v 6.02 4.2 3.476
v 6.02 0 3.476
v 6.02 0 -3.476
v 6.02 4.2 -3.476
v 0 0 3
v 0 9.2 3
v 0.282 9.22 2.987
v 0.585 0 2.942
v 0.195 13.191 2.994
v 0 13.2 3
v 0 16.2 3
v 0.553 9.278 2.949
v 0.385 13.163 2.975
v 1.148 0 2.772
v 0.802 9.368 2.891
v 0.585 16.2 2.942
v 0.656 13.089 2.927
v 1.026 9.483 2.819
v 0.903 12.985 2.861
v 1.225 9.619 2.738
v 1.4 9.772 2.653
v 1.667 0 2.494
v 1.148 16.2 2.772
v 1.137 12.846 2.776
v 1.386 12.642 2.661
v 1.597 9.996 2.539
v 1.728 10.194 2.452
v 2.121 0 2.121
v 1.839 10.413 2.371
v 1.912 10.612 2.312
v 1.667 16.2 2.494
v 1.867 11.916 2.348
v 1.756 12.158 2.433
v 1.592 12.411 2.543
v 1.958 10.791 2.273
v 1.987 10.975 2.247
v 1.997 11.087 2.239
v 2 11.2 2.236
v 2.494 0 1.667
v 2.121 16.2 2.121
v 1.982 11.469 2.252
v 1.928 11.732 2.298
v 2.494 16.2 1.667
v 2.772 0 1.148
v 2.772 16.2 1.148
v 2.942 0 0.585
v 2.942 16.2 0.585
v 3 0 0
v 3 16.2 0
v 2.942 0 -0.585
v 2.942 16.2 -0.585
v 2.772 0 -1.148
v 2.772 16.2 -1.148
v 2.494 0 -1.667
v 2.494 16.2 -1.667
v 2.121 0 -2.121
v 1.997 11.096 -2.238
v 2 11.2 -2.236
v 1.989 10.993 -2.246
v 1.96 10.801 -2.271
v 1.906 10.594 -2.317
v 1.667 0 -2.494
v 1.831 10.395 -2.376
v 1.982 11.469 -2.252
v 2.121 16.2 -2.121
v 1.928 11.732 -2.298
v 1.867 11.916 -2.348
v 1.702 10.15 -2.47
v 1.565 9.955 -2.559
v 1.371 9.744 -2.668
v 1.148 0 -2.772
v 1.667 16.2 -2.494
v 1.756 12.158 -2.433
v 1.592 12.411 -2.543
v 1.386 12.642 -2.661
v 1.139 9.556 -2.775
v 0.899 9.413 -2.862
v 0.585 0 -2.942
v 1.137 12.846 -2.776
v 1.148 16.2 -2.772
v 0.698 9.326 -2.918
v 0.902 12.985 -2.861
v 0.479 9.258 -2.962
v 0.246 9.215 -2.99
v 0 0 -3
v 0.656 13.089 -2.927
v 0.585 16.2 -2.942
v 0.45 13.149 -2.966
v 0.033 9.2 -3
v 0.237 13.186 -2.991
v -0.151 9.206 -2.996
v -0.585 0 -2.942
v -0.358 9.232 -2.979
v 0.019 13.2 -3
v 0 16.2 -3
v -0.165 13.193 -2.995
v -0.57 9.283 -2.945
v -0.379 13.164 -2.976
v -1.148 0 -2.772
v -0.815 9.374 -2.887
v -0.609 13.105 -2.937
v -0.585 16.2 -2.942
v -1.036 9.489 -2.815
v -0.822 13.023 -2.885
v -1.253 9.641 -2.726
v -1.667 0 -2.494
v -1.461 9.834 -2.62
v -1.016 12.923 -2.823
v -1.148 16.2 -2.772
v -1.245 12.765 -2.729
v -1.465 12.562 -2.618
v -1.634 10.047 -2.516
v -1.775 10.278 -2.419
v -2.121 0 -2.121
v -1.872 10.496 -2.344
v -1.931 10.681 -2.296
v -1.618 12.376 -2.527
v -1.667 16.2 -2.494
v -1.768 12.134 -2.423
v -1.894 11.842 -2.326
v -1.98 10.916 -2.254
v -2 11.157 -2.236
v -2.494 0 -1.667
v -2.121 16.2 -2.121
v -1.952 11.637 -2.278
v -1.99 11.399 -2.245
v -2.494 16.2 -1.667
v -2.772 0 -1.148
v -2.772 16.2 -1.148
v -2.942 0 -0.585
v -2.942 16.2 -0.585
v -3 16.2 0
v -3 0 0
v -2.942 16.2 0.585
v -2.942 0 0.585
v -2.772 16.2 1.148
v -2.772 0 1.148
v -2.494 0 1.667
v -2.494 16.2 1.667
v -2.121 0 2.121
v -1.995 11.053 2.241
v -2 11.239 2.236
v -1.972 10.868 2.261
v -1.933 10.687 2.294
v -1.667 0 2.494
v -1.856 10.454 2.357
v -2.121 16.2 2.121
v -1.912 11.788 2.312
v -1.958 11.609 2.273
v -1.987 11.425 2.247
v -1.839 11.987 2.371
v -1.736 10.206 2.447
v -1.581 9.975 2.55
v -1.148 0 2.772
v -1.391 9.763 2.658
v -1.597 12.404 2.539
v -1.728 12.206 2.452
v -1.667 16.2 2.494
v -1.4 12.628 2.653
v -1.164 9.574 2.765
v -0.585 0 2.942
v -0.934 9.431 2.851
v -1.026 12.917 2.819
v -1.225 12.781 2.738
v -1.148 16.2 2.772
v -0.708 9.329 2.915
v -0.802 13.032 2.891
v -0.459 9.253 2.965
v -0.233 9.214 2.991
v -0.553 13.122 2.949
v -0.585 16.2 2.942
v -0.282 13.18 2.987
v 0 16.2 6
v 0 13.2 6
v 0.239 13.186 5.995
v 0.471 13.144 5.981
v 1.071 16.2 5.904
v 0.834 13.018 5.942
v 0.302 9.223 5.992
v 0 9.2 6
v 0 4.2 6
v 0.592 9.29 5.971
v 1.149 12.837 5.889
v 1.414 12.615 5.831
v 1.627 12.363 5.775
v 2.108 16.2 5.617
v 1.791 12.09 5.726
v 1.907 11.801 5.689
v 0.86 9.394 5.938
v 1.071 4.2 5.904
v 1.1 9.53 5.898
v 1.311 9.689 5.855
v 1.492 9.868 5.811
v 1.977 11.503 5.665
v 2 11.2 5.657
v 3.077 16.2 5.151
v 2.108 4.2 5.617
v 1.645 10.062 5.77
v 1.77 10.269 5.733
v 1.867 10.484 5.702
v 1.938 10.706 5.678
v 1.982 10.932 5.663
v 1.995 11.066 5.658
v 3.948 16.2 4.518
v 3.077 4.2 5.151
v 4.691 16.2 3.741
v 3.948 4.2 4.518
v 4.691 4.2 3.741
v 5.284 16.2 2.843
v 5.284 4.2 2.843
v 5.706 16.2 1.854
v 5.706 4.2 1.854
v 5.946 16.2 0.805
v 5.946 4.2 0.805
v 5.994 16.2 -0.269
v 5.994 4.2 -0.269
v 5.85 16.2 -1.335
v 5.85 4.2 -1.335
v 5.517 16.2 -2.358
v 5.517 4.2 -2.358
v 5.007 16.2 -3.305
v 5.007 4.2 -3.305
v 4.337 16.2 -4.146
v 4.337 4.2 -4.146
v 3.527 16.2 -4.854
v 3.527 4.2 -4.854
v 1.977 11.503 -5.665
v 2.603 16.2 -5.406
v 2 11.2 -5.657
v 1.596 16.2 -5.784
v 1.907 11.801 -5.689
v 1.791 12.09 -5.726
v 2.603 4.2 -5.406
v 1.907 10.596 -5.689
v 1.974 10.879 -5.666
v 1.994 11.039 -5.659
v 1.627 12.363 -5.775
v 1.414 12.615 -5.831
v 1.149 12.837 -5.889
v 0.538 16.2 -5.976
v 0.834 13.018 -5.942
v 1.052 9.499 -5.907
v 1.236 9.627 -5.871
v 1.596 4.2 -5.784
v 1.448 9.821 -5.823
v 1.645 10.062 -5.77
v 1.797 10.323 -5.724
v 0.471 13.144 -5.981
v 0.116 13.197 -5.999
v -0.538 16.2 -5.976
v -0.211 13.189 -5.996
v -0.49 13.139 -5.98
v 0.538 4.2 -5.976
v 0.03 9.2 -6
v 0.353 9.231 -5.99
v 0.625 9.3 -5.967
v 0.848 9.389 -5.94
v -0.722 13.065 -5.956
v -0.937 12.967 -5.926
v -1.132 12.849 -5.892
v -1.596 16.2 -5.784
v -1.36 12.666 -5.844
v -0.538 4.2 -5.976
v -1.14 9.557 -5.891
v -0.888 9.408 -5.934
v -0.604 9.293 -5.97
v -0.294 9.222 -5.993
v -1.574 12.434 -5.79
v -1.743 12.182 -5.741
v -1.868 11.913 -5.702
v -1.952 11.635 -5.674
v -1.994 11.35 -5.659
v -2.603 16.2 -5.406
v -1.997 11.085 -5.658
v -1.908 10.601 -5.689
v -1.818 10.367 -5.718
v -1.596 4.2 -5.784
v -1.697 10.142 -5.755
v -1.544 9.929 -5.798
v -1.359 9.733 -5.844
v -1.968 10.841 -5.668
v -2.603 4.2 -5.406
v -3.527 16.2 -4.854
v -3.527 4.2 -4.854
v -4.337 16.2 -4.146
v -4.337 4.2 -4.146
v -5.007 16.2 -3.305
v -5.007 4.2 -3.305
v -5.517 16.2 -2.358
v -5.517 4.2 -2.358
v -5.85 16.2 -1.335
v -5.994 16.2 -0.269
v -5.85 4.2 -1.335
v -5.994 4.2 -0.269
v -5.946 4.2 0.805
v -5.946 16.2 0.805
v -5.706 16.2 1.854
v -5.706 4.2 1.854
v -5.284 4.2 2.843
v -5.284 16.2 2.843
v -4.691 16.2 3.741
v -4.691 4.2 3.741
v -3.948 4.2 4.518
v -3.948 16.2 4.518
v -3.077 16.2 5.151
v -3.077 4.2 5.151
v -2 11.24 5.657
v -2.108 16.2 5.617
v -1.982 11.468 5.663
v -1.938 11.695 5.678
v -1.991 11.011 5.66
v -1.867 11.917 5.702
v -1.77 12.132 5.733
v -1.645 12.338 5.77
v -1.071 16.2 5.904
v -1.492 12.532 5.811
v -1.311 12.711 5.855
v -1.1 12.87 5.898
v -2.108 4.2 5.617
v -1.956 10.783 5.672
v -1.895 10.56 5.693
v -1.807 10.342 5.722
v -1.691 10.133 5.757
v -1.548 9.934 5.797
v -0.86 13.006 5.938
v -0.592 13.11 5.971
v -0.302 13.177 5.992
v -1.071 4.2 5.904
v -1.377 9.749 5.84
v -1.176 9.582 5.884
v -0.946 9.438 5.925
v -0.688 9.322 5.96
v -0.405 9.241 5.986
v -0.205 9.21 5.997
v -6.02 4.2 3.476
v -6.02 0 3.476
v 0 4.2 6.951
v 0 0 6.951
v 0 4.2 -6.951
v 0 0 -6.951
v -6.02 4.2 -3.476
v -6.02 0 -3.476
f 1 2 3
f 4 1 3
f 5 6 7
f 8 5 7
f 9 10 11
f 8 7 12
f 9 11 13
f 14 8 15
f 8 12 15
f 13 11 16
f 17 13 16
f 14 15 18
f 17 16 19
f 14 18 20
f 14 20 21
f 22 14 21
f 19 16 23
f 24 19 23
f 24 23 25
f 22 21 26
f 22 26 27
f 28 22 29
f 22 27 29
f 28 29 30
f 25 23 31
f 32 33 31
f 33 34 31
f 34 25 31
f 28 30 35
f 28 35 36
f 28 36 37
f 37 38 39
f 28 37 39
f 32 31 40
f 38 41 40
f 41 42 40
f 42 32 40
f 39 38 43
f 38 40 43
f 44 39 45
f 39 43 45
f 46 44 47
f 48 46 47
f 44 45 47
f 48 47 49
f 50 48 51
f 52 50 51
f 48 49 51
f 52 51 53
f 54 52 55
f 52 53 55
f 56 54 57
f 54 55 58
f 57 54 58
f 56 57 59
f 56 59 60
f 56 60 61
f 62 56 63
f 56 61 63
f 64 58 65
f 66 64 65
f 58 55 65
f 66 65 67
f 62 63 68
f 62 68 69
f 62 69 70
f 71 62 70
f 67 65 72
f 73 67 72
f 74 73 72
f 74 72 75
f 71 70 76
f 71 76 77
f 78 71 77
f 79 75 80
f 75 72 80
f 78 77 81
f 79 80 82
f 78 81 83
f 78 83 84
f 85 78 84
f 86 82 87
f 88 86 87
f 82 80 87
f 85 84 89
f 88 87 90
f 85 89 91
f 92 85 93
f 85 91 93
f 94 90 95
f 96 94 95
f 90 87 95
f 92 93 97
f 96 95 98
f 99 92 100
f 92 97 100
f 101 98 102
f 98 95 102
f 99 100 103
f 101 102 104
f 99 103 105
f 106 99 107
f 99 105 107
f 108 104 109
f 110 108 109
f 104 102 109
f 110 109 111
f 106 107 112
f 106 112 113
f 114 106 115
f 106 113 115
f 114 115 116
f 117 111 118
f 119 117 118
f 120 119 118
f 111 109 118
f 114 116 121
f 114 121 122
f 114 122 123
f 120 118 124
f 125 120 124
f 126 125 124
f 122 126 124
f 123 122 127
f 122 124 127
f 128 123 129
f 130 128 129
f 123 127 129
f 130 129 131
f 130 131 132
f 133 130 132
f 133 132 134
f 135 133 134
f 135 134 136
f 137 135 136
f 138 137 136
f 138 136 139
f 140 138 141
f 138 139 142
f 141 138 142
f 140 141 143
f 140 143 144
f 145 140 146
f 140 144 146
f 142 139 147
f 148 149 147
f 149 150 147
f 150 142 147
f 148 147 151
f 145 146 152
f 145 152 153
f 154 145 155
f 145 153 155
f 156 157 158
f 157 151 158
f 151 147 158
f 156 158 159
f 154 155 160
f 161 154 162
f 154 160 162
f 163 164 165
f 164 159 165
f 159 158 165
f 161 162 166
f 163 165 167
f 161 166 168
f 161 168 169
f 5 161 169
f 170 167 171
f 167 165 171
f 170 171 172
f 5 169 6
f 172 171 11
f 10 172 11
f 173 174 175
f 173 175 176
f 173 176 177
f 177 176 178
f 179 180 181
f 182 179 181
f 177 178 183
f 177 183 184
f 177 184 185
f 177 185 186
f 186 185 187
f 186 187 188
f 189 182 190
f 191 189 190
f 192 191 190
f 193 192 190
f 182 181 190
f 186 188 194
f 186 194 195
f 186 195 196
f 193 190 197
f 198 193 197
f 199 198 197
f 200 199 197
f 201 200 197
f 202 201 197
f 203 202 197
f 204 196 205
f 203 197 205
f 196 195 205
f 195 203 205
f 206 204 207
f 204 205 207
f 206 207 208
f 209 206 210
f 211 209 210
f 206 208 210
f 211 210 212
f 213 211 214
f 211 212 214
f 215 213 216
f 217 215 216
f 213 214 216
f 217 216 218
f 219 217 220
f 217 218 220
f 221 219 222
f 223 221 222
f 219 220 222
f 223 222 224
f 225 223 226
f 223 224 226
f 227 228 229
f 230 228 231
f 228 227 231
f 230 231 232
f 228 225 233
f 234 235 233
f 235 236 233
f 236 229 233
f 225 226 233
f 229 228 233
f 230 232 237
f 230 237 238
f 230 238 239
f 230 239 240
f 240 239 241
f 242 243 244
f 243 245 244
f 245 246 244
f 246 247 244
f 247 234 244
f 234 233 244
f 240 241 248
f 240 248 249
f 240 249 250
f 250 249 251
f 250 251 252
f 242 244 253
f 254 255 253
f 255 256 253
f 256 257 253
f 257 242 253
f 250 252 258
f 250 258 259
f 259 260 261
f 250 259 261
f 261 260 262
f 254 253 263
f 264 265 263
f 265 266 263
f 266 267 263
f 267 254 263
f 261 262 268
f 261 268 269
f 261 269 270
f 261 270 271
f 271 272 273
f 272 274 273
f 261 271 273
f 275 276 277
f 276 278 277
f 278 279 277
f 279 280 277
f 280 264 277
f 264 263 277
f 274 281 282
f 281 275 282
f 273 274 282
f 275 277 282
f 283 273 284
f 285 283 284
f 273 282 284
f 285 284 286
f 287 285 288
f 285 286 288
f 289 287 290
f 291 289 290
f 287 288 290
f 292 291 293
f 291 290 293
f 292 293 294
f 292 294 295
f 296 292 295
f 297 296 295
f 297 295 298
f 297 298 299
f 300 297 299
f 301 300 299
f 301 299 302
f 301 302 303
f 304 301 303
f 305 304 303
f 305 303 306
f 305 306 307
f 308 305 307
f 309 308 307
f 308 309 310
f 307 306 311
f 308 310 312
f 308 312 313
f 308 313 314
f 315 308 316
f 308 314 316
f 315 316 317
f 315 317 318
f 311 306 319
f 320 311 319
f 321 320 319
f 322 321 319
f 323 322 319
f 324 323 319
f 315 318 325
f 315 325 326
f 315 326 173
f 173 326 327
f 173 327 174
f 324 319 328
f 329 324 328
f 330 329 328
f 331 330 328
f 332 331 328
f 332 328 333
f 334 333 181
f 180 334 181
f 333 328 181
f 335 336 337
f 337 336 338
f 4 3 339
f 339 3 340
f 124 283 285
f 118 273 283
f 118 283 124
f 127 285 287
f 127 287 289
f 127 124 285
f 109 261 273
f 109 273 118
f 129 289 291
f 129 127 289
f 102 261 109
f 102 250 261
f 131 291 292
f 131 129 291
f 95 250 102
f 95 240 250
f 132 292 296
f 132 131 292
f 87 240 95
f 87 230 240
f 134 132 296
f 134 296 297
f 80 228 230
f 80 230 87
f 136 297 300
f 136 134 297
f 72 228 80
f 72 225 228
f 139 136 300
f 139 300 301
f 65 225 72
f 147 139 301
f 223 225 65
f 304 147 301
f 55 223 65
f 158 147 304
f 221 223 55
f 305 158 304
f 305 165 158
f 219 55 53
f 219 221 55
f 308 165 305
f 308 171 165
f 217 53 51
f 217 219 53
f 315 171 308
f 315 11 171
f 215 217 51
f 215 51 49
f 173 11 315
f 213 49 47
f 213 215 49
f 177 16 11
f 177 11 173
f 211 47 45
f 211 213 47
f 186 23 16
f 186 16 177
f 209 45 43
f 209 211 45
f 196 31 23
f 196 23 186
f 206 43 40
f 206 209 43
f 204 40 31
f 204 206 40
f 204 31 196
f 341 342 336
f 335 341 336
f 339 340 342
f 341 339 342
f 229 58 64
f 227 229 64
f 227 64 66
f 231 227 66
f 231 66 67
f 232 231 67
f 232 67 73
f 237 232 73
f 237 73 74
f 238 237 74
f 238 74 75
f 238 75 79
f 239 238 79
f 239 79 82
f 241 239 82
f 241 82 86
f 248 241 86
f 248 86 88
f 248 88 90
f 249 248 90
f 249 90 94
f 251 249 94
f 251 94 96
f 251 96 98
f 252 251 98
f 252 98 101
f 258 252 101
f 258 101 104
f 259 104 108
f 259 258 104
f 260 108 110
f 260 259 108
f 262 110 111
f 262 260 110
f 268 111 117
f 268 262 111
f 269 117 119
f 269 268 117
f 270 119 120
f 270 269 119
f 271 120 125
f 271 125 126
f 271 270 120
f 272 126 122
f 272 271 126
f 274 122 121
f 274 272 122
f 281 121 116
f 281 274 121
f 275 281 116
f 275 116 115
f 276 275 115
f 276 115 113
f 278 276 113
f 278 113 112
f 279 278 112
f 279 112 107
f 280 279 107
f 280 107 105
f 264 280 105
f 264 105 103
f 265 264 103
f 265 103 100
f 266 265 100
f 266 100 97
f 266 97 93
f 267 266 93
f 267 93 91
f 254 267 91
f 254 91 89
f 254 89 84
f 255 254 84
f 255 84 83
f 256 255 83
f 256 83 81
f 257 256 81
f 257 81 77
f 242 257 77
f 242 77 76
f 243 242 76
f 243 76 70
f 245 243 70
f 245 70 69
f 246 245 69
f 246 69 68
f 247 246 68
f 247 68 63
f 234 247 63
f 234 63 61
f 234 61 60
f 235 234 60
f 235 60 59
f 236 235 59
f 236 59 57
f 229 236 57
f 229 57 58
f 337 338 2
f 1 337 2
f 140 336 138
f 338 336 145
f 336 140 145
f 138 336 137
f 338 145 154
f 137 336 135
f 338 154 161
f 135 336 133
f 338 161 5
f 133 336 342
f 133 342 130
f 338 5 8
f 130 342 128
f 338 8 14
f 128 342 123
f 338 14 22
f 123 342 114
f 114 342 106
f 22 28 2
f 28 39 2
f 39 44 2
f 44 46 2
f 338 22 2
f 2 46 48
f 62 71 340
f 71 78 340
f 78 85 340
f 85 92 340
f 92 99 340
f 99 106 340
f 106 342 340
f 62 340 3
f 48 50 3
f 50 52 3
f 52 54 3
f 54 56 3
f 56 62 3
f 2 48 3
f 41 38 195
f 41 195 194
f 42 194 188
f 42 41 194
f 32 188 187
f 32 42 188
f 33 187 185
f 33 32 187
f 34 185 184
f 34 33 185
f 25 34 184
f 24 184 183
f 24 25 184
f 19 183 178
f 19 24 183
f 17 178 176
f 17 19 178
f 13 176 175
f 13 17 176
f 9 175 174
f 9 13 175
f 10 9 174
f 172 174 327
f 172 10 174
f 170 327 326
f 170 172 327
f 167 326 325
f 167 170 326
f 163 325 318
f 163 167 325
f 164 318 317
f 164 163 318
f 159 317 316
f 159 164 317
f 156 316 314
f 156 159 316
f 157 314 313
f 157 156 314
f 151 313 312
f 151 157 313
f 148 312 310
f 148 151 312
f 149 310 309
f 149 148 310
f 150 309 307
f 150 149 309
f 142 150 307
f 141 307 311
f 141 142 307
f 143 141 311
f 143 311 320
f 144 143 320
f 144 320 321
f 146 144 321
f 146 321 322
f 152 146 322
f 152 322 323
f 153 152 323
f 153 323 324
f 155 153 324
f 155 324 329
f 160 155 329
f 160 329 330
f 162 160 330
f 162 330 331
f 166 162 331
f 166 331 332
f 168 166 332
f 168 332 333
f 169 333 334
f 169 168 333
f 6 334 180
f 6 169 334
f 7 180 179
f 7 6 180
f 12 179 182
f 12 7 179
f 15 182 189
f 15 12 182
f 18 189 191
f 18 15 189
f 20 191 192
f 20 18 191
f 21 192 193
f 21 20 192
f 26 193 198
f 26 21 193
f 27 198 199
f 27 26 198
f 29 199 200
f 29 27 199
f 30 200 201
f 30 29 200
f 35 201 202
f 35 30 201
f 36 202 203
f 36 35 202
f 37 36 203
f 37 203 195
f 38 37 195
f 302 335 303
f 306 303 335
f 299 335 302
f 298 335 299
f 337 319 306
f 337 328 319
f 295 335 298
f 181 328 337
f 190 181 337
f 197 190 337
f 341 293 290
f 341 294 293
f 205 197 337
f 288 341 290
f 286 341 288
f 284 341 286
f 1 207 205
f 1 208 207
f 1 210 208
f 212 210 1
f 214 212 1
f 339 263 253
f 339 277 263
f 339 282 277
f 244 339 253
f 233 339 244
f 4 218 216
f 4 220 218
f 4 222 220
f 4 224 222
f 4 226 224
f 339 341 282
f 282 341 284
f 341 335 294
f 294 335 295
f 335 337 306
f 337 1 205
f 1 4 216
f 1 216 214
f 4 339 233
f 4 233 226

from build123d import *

# Parameters (mm, degrees)
SALIENTE_EXTRUIR1_DEPTH    = 4.2
CROQUIS2_R                 = 6
SALIENTE_EXTRUIR2_DEPTH    = 12
CROQUIS3_R                 = 3
CORTAR_EXTRUIR1_DEPTH      = 19.627961062
CORTAR_EXTRUIR2_DEPTH      = 19.627961062
CORTAR_EXTRUIR2_DEPTH_BACK = 19.627961062
CROQUIS4_R                 = 2


with BuildPart() as part:
    # Croquis1 → Saliente-Extruir1 (new body)
    with BuildSketch(Plane(origin=(0, 0, 0), x_dir=(1, 0, 0), z_dir=(0, 1, 0))):
        Polygon((0, 6.951297241), (-6.02, 3.475648621), (-6.02, -3.475648621), (0, -6.951297241), (6.02, -3.475648621), (6.02, 3.475648621), align=None)
    extrude(amount=SALIENTE_EXTRUIR1_DEPTH)

    # Croquis2 → Saliente-Extruir2 (add)
    with BuildSketch(Plane(origin=(0, 4.2, 0), x_dir=(1, 0, 0), z_dir=(0, 1, 0))):
        with Locations(Location((0, 0, 0), (0, 0, 270))):
            Circle(CROQUIS2_R)
    extrude(amount=SALIENTE_EXTRUIR2_DEPTH)

    # Croquis3 → Cortar-Extruir1 (cut, through all)
    with BuildSketch(Plane(origin=(0, 16.2, 0), x_dir=(1, 0, 0), z_dir=(0, 1, 0))):
        with Locations(Location((0, 0, 0), (0, 0, 270))):
            Circle(CROQUIS3_R)
    extrude(amount=-CORTAR_EXTRUIR1_DEPTH, mode=Mode.SUBTRACT)

    # Croquis4 → Cortar-Extruir2 (cut, two sides: drawn at the far end of the back side and taken through both)
    with BuildSketch(Plane.XY.offset(-CORTAR_EXTRUIR2_DEPTH_BACK)):
        with Locations((0, 11.2)):
            Circle(CROQUIS4_R)
    extrude(amount=CORTAR_EXTRUIR2_DEPTH + CORTAR_EXTRUIR2_DEPTH_BACK, mode=Mode.SUBTRACT)


solid = part.part
